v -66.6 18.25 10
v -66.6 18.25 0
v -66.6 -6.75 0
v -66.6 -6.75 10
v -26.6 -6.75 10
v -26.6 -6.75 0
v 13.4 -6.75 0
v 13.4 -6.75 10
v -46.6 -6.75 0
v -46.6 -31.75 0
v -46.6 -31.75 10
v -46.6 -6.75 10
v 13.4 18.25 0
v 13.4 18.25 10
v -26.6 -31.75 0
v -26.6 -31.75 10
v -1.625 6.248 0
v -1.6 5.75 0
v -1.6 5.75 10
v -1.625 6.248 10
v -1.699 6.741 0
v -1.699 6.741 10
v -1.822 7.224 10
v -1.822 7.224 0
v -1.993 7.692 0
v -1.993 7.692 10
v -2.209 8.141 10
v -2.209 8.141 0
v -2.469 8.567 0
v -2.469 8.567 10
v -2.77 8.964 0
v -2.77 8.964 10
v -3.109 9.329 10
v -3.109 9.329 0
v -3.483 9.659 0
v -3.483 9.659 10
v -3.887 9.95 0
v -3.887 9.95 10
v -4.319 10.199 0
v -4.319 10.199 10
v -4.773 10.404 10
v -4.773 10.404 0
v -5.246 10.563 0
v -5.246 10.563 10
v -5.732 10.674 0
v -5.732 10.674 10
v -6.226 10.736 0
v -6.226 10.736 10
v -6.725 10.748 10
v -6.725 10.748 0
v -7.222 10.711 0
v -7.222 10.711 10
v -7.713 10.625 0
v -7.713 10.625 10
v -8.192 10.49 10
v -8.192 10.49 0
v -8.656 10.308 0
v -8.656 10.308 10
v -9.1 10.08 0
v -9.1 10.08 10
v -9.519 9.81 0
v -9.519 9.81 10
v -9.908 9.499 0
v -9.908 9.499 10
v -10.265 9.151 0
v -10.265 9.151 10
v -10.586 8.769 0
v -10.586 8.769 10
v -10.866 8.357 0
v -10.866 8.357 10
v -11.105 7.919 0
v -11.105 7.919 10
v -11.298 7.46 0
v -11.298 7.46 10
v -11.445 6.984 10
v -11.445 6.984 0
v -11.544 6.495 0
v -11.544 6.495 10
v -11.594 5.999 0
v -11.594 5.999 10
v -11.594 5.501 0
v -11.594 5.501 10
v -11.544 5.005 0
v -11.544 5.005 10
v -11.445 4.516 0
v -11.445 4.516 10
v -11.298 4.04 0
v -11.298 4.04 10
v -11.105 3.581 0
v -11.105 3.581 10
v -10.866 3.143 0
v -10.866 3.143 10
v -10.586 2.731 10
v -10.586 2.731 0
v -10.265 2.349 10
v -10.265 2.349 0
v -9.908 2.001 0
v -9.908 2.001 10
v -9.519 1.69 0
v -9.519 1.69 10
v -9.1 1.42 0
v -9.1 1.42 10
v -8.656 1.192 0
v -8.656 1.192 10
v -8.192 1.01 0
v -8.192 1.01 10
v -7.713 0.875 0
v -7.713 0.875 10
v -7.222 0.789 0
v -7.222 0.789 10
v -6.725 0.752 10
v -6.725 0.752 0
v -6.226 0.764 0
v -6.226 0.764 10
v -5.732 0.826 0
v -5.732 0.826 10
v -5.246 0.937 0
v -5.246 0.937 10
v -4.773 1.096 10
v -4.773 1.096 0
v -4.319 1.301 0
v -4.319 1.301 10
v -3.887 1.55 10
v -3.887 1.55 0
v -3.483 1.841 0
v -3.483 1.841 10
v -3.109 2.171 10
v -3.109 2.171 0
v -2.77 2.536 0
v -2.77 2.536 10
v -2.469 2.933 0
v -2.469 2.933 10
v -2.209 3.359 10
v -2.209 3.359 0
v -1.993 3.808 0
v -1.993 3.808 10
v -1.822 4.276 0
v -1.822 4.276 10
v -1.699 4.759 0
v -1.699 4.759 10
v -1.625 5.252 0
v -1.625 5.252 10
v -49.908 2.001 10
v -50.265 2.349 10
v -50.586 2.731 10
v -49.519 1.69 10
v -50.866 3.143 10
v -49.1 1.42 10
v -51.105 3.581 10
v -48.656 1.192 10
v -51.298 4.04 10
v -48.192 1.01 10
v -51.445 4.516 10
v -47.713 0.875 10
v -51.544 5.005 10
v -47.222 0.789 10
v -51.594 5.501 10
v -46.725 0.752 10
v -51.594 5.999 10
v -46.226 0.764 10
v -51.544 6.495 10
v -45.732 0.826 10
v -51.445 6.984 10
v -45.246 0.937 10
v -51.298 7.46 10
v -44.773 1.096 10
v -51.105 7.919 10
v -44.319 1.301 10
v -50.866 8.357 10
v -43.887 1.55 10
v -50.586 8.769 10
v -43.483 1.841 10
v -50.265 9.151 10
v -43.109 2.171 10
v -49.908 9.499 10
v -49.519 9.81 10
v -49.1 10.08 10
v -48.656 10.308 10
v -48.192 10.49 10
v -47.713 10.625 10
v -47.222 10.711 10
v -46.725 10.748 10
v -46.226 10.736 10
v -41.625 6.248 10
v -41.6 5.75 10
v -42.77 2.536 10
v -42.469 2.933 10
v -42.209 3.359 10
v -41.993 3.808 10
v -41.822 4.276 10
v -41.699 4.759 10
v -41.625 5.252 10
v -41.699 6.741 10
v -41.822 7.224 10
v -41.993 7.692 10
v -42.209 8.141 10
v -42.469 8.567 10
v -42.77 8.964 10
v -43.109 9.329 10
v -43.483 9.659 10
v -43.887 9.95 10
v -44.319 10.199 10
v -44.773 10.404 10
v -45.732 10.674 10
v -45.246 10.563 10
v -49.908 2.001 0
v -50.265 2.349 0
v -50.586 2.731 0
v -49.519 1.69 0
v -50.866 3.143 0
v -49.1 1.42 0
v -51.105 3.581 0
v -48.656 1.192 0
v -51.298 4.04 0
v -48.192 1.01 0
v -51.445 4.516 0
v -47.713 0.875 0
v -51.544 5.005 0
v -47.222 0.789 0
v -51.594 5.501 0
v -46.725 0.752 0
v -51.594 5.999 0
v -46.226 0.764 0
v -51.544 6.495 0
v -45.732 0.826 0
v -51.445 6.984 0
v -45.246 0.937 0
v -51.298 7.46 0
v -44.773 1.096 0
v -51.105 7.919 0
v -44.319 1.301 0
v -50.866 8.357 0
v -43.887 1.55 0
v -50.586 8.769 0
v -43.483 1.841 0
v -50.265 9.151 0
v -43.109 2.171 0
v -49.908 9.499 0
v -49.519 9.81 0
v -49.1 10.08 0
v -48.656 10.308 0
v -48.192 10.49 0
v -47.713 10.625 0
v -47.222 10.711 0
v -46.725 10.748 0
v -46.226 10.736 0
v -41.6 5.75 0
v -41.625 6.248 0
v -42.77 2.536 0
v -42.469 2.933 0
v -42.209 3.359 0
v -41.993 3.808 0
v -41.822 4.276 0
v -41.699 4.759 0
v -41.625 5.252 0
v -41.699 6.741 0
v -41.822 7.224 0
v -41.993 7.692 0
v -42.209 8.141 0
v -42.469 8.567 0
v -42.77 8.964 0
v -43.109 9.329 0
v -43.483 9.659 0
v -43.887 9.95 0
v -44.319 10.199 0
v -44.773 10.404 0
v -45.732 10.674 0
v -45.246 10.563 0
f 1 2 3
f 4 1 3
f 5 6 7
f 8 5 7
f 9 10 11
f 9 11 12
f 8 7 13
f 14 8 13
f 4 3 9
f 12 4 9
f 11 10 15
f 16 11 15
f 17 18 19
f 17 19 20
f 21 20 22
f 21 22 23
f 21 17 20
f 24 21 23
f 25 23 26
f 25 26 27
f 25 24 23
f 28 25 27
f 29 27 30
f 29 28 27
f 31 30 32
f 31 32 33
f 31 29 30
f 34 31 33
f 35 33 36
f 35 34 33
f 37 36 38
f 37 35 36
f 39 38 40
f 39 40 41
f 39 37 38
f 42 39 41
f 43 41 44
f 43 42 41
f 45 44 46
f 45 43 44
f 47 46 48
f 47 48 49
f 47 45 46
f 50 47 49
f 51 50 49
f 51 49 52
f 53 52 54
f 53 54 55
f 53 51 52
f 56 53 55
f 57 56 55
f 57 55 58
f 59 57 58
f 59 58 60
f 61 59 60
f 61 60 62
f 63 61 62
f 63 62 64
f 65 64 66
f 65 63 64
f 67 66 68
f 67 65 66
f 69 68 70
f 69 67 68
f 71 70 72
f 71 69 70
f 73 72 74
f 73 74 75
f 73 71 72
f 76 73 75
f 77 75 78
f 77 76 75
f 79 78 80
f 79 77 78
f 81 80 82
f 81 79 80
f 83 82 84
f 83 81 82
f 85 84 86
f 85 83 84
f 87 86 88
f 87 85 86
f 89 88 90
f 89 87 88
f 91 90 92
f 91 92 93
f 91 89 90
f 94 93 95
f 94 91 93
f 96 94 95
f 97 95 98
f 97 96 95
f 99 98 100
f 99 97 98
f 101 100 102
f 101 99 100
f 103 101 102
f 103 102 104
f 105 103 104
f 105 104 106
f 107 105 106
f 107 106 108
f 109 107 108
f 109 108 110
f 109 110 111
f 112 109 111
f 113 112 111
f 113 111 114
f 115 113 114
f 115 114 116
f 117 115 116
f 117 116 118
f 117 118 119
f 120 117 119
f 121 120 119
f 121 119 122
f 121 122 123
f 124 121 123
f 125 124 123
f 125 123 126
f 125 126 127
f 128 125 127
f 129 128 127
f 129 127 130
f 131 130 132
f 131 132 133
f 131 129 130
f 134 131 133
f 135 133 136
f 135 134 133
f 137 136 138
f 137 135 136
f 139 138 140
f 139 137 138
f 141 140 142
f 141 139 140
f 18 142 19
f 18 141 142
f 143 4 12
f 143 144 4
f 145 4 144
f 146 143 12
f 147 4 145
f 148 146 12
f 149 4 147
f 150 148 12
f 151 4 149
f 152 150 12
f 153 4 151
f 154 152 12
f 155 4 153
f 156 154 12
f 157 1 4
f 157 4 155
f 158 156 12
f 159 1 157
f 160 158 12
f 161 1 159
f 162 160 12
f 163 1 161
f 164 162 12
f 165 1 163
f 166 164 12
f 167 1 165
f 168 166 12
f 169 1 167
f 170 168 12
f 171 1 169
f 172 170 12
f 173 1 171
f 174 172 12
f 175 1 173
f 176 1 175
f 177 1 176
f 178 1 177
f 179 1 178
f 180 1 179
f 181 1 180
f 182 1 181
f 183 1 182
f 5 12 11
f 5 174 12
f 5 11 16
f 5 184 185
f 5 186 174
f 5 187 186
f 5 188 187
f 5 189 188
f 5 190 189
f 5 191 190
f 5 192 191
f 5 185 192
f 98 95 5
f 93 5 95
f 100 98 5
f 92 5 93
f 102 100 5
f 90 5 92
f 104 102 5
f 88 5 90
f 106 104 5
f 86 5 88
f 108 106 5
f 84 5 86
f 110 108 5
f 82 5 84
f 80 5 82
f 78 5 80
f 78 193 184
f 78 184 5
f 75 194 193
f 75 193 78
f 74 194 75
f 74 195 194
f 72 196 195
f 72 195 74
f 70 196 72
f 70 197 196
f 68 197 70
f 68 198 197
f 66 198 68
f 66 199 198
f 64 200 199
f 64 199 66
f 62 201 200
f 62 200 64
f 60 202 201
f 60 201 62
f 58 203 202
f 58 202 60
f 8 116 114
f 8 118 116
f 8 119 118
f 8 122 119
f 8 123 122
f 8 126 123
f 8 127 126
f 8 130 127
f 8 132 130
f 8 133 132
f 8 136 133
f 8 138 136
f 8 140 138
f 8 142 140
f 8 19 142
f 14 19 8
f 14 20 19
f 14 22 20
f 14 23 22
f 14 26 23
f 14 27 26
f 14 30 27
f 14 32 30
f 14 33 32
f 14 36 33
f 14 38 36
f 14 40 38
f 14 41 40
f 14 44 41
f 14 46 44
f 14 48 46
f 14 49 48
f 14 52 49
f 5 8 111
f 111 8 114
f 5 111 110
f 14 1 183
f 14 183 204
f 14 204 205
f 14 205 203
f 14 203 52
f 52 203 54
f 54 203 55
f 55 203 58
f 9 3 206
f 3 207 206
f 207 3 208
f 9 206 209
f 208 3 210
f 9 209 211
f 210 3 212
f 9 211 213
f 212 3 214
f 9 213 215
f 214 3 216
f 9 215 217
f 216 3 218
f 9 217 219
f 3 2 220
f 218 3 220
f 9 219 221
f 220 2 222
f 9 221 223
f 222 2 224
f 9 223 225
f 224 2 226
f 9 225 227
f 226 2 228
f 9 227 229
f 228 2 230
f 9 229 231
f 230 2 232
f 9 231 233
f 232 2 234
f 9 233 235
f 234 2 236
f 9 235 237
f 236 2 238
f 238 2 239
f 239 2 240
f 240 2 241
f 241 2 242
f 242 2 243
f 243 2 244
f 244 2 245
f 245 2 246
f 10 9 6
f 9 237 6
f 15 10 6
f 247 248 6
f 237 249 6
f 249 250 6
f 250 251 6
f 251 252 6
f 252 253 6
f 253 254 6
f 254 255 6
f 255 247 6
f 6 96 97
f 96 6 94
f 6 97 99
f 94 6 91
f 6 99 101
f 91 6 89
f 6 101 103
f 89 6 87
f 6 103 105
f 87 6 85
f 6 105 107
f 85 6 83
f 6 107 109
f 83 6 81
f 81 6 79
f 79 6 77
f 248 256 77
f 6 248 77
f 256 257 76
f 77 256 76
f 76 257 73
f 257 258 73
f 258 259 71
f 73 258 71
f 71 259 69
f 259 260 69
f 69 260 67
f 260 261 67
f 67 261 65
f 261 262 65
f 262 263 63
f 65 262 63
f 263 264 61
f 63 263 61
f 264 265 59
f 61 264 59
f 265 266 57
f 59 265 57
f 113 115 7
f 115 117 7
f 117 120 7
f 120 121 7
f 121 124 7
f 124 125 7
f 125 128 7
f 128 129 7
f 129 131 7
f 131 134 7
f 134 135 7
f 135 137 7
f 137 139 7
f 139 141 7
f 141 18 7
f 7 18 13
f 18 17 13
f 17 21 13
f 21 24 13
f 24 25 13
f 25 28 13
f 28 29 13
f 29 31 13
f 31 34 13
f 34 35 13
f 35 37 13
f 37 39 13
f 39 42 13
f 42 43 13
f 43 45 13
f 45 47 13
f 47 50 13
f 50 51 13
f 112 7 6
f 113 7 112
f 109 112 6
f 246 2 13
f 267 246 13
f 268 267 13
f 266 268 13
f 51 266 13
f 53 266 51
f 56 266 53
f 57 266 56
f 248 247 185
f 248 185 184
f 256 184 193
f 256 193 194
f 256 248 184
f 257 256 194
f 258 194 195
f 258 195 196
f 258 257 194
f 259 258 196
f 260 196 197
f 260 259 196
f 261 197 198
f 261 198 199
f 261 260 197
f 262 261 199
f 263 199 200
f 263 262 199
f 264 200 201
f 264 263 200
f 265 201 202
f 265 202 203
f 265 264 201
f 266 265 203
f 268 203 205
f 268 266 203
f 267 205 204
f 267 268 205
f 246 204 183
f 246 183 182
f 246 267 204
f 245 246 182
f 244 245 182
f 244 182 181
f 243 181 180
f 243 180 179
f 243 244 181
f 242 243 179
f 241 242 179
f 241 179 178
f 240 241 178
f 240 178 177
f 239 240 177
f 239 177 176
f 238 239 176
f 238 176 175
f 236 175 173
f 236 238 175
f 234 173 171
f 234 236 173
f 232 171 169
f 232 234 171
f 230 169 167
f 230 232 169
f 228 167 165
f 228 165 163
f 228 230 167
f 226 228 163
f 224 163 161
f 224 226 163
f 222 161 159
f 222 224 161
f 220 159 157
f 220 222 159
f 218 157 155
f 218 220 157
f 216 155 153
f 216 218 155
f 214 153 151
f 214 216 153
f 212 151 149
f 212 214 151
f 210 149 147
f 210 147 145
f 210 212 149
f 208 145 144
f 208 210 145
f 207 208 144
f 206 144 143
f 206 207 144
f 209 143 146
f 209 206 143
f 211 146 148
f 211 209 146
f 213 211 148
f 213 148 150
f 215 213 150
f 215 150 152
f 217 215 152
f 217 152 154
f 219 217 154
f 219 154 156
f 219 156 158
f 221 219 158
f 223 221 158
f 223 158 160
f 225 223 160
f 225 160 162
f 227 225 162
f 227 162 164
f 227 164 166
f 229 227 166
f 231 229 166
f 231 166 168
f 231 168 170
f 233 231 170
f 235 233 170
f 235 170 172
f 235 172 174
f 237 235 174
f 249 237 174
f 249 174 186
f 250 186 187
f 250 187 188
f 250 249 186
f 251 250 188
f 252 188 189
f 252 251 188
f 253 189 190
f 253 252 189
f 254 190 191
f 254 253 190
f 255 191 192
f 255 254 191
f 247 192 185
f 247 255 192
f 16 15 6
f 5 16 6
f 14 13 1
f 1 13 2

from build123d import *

# Parameters (mm, degrees)
F0_R     = 5
F0_W     = 40
F0_H     = 25
F0_W_2   = 20
F1_DEPTH = 10


with BuildPart() as f1:
    # F0 (on Top) → F1 (new body)
    with BuildSketch(Plane.XY):
        Polygon((-26.600002, 18.249999), (-66.600002, 18.249999), (-66.600002, -6.750001), (-46.600002, -6.750001), (-26.600002, -6.750001), align=None)
        with Locations((-46.600002, 5.749999)):
            Circle(F0_R, mode=Mode.SUBTRACT)
        with Locations((-6.600002, 5.749999)):
            Rectangle(F0_W, F0_H)
        with Locations((-6.600002, 5.749999)):
            Circle(F0_R, mode=Mode.SUBTRACT)
        with Locations((-36.600002, -19.250001)):
            Rectangle(F0_W_2, F0_H)
    extrude(amount=F1_DEPTH)


solid = f1.part
